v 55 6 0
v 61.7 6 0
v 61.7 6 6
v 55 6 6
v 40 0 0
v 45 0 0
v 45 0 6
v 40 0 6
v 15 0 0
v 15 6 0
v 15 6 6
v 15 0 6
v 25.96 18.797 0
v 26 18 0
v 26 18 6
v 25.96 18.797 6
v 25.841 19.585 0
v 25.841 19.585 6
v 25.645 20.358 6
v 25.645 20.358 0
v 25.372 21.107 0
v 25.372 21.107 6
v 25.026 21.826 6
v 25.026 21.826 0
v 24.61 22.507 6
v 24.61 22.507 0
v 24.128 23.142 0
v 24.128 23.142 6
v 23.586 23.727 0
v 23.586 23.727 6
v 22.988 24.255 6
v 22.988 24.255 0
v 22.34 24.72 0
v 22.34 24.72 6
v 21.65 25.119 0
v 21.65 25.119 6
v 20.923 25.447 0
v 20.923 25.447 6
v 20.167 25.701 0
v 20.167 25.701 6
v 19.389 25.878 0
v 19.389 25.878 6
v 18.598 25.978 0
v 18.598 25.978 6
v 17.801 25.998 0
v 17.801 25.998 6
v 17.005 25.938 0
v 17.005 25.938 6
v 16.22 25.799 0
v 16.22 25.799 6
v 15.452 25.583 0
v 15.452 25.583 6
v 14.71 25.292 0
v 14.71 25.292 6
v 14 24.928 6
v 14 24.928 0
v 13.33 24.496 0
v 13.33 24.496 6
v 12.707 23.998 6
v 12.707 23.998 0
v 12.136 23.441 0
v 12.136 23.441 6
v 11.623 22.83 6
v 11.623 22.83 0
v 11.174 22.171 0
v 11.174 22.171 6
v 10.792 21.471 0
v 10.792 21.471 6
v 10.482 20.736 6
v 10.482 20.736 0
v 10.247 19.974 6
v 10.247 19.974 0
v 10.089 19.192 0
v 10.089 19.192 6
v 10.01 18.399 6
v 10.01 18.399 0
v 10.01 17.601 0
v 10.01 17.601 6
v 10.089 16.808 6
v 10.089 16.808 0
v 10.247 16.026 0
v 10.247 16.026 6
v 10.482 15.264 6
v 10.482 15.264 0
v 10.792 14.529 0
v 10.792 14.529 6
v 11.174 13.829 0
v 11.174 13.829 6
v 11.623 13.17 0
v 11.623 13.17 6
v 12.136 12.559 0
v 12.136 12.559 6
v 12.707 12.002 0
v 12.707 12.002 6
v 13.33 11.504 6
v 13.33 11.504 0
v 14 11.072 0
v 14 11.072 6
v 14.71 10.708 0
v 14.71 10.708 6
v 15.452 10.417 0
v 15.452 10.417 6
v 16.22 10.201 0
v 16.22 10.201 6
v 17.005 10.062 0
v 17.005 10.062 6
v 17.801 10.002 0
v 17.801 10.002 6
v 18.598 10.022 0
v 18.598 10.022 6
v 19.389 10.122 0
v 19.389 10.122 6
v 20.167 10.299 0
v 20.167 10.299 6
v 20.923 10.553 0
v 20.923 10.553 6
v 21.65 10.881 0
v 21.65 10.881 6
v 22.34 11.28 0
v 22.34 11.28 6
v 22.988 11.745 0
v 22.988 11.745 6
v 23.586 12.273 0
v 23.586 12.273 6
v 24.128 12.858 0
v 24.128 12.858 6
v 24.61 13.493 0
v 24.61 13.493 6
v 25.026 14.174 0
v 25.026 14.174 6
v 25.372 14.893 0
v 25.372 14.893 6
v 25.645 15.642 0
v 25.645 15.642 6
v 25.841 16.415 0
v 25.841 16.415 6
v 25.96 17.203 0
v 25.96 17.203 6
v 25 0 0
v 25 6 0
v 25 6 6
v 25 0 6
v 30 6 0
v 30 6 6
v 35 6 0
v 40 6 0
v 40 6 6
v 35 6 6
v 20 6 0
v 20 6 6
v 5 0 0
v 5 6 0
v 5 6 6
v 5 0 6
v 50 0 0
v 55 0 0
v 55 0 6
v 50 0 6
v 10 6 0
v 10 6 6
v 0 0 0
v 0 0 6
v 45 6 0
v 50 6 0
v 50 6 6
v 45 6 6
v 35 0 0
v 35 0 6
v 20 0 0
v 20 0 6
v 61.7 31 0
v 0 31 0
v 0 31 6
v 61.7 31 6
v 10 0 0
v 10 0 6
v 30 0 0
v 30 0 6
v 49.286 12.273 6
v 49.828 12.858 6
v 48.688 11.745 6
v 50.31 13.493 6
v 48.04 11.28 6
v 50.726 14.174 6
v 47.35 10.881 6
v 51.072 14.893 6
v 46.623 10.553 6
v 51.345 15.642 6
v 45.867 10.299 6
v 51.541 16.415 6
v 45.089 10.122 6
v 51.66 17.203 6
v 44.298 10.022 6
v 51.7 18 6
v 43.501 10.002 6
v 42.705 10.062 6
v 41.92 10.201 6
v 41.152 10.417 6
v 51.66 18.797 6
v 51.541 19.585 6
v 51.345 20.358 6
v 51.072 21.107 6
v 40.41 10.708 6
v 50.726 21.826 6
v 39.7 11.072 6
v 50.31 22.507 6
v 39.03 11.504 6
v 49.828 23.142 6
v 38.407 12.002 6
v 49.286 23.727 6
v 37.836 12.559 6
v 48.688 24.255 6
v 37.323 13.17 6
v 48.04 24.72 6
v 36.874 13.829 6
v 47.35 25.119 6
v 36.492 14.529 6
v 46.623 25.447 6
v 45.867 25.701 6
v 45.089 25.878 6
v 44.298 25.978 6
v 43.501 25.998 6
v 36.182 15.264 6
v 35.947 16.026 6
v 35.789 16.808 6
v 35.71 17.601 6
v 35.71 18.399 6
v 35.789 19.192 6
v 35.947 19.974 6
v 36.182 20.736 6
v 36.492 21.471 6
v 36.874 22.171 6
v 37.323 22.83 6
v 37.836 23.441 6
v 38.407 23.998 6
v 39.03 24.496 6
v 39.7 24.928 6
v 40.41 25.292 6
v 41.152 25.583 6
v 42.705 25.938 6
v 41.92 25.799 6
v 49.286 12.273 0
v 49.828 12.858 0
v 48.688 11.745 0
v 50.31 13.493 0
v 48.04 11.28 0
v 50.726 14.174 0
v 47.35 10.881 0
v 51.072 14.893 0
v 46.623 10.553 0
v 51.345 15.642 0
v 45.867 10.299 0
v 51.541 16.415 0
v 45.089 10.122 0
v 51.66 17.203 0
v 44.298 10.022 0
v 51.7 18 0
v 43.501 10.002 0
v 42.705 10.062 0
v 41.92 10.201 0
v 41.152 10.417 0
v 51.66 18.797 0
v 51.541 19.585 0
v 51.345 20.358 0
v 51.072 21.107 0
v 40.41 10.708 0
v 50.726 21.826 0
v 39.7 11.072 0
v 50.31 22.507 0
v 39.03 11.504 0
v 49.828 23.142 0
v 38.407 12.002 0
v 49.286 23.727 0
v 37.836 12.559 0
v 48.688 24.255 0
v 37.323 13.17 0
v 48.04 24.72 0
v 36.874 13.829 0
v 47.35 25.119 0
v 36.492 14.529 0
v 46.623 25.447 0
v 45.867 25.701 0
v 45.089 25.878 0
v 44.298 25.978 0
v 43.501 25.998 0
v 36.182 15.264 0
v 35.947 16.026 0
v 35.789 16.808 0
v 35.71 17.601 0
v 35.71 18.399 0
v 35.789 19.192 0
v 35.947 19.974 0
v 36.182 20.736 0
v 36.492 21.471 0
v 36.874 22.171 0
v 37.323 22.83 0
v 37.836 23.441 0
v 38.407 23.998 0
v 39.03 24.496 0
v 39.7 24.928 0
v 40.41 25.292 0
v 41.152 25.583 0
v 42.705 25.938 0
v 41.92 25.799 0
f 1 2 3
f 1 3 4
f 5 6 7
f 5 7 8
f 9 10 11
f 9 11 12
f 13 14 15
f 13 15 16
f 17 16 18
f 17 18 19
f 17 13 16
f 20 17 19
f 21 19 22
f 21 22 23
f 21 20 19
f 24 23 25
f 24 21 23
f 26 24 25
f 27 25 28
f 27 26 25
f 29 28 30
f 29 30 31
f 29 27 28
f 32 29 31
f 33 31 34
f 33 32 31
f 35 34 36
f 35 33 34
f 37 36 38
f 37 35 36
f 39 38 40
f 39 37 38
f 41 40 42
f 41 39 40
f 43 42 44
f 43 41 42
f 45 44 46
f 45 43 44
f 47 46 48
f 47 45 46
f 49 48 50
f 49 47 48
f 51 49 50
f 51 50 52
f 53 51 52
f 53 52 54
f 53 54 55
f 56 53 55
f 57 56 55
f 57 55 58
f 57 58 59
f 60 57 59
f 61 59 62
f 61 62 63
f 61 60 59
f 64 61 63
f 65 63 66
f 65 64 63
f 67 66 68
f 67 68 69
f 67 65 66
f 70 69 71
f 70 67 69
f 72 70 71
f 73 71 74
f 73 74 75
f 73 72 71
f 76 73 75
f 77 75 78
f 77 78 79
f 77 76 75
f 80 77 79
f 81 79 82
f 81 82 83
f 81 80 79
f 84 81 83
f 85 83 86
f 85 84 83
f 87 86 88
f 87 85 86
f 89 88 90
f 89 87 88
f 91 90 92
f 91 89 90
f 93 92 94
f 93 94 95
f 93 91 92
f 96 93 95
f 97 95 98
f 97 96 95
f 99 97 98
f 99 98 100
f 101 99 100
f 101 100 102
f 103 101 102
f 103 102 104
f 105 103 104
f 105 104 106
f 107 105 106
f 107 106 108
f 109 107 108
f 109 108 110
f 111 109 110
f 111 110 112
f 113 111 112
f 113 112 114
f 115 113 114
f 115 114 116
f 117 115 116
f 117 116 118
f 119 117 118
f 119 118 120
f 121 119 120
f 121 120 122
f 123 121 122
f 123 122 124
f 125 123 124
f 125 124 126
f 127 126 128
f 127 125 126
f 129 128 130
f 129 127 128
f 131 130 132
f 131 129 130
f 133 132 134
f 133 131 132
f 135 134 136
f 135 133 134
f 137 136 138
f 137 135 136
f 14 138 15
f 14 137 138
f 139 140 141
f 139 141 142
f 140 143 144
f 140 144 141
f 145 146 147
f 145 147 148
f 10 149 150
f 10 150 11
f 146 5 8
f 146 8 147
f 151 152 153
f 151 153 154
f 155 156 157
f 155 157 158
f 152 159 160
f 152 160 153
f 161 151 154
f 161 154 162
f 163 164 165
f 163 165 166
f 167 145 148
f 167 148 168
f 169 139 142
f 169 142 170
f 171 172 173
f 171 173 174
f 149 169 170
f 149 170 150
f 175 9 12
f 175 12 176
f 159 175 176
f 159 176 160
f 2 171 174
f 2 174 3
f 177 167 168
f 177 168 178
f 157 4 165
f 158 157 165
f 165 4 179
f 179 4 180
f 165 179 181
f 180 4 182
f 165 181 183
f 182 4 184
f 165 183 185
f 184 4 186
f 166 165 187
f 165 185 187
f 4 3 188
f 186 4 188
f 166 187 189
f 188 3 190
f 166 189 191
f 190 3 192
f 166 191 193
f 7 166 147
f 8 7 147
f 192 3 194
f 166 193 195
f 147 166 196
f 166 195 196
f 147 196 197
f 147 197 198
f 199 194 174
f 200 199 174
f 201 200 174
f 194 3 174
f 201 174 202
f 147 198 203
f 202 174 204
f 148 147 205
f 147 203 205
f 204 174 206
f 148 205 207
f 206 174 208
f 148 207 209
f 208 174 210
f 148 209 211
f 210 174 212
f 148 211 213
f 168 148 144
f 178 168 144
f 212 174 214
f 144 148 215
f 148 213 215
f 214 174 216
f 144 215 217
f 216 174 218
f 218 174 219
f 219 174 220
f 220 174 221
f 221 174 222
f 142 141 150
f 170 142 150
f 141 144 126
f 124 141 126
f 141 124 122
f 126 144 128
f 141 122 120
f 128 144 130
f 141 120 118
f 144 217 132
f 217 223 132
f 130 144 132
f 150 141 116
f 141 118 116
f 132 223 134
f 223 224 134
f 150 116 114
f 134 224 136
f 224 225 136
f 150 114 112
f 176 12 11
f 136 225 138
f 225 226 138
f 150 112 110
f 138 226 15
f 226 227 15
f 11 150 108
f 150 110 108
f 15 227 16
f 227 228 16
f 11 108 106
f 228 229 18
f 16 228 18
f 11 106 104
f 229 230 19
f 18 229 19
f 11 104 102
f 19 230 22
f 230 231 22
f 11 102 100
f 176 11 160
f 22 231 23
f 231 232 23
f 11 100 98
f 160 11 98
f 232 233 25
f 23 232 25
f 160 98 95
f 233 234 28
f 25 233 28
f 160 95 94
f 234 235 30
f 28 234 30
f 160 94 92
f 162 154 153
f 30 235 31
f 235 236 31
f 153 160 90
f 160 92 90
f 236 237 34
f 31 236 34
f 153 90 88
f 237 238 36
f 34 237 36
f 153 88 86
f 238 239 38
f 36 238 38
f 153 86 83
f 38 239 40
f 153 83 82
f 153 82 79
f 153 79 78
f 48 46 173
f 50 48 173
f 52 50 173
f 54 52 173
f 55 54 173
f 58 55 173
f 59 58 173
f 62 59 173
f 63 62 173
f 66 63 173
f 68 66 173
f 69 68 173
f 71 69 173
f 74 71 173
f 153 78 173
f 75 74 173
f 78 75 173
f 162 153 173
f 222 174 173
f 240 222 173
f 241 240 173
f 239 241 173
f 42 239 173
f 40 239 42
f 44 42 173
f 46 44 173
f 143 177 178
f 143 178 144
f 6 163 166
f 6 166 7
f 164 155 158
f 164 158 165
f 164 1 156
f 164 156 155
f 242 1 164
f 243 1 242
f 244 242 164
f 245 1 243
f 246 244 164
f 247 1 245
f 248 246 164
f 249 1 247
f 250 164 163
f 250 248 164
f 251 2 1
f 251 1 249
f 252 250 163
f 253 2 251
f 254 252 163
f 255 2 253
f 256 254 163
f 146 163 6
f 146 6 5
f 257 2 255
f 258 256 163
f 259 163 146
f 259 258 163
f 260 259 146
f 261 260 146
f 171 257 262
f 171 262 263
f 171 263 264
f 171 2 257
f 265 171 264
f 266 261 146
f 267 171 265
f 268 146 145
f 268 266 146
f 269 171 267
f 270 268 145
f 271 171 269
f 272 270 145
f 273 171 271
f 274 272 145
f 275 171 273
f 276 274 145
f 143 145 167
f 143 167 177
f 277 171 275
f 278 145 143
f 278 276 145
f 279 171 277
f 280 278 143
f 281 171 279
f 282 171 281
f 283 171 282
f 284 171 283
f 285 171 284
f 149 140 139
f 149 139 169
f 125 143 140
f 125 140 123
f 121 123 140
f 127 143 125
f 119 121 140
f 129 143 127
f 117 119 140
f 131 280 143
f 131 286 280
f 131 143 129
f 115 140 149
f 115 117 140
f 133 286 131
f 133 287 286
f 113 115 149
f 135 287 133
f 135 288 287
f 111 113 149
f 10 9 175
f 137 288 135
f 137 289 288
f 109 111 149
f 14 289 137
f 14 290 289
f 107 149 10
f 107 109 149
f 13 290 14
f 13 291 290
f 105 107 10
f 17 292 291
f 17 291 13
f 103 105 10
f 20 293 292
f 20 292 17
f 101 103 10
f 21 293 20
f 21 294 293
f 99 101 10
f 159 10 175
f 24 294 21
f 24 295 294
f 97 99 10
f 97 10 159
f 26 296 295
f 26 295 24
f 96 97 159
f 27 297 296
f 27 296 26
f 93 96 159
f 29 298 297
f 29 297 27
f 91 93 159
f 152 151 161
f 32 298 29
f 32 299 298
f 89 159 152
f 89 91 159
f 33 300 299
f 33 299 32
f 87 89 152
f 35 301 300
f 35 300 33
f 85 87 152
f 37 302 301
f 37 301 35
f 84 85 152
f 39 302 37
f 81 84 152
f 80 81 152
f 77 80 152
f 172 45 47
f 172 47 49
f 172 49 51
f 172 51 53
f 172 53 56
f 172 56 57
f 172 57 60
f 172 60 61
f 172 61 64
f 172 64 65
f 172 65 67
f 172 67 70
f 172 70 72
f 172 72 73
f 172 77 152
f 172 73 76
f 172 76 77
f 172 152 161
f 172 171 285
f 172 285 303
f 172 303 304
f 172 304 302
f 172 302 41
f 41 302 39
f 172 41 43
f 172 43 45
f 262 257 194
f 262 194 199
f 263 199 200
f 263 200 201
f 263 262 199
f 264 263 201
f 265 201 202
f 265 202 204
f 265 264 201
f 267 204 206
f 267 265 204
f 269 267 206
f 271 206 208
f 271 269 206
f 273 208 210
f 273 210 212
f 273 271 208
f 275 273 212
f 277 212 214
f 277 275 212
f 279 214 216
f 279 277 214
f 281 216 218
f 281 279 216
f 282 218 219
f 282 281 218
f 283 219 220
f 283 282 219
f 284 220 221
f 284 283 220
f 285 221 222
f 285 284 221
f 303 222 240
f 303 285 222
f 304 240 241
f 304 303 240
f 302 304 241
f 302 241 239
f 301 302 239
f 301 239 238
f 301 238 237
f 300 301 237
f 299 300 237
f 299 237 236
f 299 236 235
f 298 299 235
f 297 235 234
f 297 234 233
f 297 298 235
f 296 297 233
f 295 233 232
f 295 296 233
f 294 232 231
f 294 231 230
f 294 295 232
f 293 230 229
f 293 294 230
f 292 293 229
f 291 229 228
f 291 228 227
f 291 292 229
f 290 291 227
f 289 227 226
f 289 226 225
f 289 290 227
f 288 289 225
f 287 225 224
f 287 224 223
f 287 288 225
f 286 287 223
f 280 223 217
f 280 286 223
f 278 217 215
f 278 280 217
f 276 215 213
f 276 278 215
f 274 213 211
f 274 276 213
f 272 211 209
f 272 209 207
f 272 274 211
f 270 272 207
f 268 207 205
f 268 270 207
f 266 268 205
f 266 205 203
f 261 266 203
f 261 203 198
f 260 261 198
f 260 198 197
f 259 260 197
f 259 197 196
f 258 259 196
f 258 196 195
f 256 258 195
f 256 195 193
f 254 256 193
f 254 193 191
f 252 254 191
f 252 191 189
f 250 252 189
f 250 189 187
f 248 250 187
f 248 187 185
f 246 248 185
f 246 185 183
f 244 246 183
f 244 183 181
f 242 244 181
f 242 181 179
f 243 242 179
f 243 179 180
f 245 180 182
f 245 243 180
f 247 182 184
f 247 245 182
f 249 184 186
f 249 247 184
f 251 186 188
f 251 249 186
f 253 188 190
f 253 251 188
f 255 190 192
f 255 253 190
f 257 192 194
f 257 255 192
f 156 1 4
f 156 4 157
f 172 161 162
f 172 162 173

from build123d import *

# Parameters (mm, degrees)
ESQUISSE1_R        = 8
BOSS_EXTRU_1_DEPTH = 6


with BuildPart() as part:
    # Esquisse1 → Boss.-Extru.1 (new body)
    with BuildSketch(Plane.XY):
        Polygon((0, 0), (0, 31), (61.7, 31), (61.7, 6), (55, 6), (55, 0), (50, 0), (50, 6), (45, 6), (45, 0), (40, 0), (40, 6), (35, 6), (35, 0), (30, 0), (30, 6), (25, 6), (25, 0), (20, 0), (20, 6), (15, 6), (15, 0), (10, 0), (10, 6), (5, 6), (5, 0), align=None)
        with Locations((18, 18)):
            Circle(ESQUISSE1_R, mode=Mode.SUBTRACT)
        with Locations((43.7, 18)):
            Circle(ESQUISSE1_R, mode=Mode.SUBTRACT)
    extrude(amount=BOSS_EXTRU_1_DEPTH)


solid = part.part
